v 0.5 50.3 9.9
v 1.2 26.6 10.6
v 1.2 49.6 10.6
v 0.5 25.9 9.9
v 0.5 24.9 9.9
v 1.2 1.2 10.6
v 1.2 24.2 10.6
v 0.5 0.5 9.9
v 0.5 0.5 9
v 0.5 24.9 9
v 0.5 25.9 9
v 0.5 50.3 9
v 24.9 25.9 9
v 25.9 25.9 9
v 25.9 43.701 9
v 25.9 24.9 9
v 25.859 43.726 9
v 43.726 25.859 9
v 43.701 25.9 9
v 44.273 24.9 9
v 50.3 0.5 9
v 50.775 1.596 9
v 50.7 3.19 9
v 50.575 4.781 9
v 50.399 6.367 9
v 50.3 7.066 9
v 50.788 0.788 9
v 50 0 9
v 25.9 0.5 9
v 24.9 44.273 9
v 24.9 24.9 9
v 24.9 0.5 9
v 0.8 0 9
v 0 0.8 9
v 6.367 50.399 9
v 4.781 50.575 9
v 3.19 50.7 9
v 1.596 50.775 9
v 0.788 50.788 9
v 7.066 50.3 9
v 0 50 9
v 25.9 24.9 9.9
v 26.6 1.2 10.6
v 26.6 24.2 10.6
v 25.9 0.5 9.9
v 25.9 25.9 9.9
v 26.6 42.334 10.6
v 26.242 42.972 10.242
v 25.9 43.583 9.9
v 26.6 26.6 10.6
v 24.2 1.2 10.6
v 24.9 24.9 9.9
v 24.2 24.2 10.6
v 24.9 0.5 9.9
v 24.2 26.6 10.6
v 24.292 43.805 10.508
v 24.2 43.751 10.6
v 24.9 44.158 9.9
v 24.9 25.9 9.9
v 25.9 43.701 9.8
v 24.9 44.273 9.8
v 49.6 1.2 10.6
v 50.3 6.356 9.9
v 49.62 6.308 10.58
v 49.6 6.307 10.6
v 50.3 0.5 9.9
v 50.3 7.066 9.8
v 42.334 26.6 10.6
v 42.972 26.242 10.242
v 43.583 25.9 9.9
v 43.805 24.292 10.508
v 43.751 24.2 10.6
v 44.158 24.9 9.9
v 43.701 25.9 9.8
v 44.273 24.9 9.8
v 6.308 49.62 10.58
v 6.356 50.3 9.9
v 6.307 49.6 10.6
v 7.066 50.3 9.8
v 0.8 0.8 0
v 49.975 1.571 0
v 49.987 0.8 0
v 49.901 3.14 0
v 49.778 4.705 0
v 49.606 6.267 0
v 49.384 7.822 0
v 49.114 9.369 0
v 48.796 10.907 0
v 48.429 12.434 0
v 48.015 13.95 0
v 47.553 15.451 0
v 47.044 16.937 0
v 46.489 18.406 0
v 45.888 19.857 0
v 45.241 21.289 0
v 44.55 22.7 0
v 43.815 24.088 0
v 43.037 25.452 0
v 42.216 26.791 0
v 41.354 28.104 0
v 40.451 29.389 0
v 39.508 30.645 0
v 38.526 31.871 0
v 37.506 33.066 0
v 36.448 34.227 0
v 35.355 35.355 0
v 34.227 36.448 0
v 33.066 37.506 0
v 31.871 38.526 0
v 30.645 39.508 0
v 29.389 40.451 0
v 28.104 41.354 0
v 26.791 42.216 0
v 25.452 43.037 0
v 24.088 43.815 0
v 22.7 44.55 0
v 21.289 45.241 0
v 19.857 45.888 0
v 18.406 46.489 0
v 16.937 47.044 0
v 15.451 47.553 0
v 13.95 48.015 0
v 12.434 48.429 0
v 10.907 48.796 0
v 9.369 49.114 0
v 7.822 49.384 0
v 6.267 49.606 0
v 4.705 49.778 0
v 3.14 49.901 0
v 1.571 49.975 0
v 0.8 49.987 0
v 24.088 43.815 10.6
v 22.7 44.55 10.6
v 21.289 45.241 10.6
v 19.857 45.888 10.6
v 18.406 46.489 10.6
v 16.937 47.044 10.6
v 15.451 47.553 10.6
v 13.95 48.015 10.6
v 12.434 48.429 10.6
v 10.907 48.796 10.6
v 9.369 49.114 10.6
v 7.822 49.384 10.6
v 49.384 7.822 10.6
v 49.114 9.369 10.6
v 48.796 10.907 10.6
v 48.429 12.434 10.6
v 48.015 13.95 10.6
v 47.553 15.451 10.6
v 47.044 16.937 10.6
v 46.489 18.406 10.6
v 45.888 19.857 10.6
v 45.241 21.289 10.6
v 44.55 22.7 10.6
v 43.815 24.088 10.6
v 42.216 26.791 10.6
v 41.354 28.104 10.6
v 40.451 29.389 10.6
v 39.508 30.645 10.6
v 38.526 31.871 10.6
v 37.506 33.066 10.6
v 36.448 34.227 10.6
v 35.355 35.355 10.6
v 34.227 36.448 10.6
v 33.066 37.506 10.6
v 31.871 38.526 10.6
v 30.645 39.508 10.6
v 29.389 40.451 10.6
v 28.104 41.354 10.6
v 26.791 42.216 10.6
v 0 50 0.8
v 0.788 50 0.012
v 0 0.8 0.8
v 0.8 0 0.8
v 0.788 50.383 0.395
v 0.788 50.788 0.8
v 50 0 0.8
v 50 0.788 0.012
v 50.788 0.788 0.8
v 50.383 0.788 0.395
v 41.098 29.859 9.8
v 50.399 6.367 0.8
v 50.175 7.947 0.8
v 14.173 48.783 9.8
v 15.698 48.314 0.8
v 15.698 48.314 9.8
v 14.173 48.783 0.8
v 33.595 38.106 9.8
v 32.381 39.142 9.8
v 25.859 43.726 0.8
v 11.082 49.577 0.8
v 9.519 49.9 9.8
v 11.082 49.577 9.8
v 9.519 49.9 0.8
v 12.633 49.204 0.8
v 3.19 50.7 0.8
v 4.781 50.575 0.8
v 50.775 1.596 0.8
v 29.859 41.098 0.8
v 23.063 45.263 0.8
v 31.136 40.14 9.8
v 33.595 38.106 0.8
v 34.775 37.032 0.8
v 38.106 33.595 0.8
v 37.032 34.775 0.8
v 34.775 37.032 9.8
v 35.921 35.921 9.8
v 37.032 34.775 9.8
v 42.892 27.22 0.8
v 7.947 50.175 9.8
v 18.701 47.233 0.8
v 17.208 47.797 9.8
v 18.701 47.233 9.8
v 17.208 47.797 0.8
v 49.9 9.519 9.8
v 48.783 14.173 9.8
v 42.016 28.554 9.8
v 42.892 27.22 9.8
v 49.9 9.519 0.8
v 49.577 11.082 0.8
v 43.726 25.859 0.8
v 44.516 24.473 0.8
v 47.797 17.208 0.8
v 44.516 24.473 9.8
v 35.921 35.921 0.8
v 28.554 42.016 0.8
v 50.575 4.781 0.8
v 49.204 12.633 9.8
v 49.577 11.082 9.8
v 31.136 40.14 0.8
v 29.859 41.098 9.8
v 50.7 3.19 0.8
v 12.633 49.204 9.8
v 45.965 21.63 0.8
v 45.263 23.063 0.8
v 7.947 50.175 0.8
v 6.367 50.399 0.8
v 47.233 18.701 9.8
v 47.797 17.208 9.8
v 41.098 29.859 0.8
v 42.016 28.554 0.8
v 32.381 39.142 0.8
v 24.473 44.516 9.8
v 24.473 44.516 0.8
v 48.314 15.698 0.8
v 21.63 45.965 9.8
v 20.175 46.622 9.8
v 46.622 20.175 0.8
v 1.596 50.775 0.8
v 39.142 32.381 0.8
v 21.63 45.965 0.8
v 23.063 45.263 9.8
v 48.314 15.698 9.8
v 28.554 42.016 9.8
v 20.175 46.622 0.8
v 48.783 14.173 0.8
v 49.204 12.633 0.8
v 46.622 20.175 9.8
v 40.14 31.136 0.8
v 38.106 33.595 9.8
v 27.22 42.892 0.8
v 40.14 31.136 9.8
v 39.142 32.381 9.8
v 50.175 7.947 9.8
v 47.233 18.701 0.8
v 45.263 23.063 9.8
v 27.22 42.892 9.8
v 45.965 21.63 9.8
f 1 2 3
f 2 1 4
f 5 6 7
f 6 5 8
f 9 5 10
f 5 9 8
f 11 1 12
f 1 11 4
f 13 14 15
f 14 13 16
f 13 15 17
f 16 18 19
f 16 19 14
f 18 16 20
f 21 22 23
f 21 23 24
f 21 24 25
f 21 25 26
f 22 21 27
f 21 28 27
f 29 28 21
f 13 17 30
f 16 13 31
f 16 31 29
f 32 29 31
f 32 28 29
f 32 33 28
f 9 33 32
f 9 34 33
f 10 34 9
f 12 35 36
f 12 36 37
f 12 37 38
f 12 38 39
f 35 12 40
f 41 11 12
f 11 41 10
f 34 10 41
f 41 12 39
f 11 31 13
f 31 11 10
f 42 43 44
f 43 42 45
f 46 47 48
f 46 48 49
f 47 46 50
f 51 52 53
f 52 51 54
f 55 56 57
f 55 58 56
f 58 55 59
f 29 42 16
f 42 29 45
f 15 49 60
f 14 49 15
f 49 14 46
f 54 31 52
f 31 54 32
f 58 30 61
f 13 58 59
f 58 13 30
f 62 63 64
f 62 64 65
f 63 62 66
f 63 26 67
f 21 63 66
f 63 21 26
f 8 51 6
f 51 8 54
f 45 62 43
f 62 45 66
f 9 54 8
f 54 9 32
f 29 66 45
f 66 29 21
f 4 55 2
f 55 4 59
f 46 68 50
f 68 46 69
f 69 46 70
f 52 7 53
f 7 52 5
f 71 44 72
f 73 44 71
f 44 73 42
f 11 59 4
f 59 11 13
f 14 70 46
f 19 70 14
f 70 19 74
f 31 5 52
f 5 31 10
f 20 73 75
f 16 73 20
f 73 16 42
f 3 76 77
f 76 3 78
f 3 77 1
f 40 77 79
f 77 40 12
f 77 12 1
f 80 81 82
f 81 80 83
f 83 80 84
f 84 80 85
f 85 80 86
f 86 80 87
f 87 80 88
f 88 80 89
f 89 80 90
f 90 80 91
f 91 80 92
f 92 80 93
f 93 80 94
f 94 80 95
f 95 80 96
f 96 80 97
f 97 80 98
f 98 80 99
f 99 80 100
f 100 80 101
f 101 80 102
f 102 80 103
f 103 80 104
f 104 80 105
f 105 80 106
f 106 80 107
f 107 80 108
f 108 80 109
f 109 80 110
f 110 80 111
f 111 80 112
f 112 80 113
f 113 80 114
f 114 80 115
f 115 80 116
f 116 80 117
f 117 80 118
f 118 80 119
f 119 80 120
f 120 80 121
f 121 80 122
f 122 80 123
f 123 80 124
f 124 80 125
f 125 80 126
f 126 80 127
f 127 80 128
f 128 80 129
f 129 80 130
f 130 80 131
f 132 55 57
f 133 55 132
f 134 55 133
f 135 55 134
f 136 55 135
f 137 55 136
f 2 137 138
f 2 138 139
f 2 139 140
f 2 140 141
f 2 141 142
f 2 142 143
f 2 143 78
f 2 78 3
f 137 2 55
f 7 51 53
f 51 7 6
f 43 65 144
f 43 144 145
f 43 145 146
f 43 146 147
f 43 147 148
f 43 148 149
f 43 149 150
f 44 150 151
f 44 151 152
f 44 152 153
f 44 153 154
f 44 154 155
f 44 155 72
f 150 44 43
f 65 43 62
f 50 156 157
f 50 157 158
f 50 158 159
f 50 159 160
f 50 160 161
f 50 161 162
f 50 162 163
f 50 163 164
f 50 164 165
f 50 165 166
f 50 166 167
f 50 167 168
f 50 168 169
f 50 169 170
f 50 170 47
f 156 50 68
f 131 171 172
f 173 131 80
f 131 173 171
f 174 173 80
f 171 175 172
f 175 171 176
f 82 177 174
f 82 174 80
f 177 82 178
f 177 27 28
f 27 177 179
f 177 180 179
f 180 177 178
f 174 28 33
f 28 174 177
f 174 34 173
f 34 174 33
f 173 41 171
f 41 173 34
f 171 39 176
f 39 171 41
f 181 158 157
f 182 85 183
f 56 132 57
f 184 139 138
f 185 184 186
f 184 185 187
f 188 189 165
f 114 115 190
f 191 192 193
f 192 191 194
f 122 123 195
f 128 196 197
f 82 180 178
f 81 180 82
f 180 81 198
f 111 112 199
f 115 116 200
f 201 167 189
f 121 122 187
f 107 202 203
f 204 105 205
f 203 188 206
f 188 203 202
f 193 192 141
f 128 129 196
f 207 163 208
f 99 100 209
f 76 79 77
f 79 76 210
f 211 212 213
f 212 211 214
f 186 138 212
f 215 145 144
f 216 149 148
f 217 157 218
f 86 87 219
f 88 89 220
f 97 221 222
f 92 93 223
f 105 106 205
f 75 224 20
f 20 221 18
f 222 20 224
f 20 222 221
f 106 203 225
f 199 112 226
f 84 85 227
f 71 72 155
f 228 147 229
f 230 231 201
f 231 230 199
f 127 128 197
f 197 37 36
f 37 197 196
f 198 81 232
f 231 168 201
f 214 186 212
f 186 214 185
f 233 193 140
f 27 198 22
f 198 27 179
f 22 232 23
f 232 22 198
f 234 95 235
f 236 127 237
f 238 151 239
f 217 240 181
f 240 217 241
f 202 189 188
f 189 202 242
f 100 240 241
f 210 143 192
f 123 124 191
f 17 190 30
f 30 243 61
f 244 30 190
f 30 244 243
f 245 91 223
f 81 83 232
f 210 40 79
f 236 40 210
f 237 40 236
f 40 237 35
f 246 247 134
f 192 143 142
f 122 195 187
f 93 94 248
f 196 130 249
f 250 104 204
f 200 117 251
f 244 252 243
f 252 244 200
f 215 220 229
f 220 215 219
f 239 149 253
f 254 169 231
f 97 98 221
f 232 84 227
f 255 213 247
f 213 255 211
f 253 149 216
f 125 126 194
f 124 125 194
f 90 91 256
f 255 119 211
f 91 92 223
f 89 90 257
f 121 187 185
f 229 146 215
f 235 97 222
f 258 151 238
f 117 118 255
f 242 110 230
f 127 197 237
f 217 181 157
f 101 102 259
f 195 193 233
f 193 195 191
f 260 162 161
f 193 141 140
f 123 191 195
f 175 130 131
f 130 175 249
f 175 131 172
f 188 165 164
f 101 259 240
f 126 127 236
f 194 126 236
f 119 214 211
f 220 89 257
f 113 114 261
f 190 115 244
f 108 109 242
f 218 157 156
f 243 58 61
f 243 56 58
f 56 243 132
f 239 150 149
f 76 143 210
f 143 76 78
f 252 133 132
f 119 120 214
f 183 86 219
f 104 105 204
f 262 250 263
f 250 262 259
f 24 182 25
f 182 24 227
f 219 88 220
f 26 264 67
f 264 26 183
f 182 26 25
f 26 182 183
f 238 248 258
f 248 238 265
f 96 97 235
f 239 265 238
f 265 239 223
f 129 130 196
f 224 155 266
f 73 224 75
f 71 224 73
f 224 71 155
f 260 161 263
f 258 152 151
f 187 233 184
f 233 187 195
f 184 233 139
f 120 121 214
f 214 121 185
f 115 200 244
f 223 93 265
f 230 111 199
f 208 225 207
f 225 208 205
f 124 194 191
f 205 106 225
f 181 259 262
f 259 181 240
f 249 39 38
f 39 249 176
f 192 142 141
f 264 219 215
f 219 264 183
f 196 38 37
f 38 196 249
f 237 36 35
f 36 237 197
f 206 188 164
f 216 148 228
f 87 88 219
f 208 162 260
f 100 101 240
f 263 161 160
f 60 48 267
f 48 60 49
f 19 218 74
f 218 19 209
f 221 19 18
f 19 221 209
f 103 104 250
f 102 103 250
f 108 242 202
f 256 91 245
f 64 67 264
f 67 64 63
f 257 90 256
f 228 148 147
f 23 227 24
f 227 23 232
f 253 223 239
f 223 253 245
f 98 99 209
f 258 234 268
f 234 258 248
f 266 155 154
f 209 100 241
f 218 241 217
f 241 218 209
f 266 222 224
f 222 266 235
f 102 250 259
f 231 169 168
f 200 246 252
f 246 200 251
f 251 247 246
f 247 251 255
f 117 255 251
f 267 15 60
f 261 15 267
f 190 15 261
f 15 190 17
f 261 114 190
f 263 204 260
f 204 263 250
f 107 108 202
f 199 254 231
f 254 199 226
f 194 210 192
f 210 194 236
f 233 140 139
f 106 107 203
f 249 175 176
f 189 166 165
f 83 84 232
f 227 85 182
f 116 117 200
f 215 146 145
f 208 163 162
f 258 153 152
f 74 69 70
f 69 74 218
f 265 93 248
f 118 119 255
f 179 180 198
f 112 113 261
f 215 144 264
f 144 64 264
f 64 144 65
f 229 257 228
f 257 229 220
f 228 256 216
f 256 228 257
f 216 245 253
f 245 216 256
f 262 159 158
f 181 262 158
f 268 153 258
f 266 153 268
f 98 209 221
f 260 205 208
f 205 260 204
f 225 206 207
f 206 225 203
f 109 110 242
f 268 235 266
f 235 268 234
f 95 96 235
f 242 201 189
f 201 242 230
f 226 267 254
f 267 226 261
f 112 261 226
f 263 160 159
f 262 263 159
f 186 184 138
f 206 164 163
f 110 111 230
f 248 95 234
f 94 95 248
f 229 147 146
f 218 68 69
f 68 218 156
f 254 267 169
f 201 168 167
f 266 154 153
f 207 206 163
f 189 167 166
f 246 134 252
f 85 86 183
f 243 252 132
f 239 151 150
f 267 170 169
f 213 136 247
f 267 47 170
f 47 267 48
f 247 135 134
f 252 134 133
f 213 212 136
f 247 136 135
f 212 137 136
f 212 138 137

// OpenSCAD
// file: libs.scad
/* set values */
//bottom thickness, total
floor_thick=10.6;
//line cuts, depth from top of bottom
floor_depth=1.6;
//square basis (inch)
basis=25.4;
//width scale for grid 45 degree edges
groove=1.2;
//width of the floor grid lines
floor_cut=1;
//bottom side bevel
bevel=.8;
//layer thickness
layer_t=.2;
//small value
ep=0.01;
//how much wall to put around the magnets
print_wall=.7;
//magnet
magnet_r=6/2;
//wall width
wall_width=.45;
//how many layers of bricks
wall_layers=3;
//height of wall, short
wall_height=1*basis;
//brick grooves in wall
wall_groove=.6;
$fs=1;
$fa=1;

module floor_plate(xsize,ysize)
{
    translate([xsize*basis/2,ysize*basis/2,floor_thick/2])hull()
    {
        cube([xsize*basis-bevel*2,ysize*basis-bevel*2,floor_thick],center=true);
        cube([xsize*basis-bevel*2,ysize*basis,floor_thick-bevel*2],center=true);
        cube([xsize*basis,ysize*basis-bevel*2,floor_thick-bevel*2],center=true);
    }
}

module grids(xsize,ysize)
{
    for (ii=[0:xsize])
    {
        translate([ii*basis,ysize*basis/2,floor_thick])rotate([0,45,0])cube([groove*sqrt(2),ysize*basis*2,groove*sqrt(2)],center=true);
        translate([ii*basis,ysize*basis/2,floor_thick-floor_depth/2])rotate([0,0,0])cube([floor_cut,ysize*basis*2,floor_depth],center=true);
    }
    for (ii=[0:ysize])
    {
        translate([xsize*basis/2,ii*basis,floor_thick])rotate([45,0,0])cube([xsize*basis*2,groove*sqrt(2),groove*sqrt(2)],center=true);
        translate([xsize*basis/2,ii*basis,floor_thick-floor_depth/2])rotate([0,0,0])cube([xsize*basis*2,floor_cut,floor_depth],center=true);
    }
}

/*
 * Openlock connection bay
 */
module openlock_chamber(buffer=0) {
    translate([-buffer,-7,1.4]) cube([2+buffer,7*2,4.4]);
    hull() {
        translate([0,-6,1.4]) cube([2,6*2,4.4]);
        translate([3+0.01,-5,1.4]) cube([2,5*2,4.4]);
    }
    translate([5,-5,1.4]) cube([8,5*2,4.4]);
    translate([7.55,-5.25,1.4]) cube([6,5.5*2,4.4]);
}
module square_openlocks(xsize,ysize)
{
    //left side
    if (ysize>1)
    {
        for(aa=[1:ysize-1])
        {
            translate([0,aa*basis,0])openlock_chamber(1);
        }
        //right side
        for(aa=[1:ysize-1])
        {
            translate([xsize*basis,aa*basis,0])rotate([0,0,180])openlock_chamber(1);
        }
    }
    if (xsize>1)
    {
        //front side
        for(aa=[1:xsize-1])
        {
            translate([aa*basis,0,0])rotate([0,0,90])openlock_chamber(1);
        }
        //back side
        for(aa=[1:xsize-1])
        {
            translate([aa*basis,ysize*basis,0])rotate([0,0,270])openlock_chamber(1);
        }
    }
}
module linear_openlocks(size)
{
    //left side
    if (size>1)
    {
        for(aa=[1:size-1])
        {
            translate([0,aa*basis,0])rotate([0,0,180])openlock_chamber(1);
        }
    }
}
module round_openlocks(size)
{
    if (size>1)
    {
        rotate([0,0,45])translate([size*basis,0,0])rotate([0,0,180])openlock_chamber(1);
    }
}
module round_wall_openlocks(size)
{
    if (size>1)
    {
        rotate([0,0,45])translate([size*basis,0,0])openlock_chamber(1);
    }
}
module square_mag_holes(xsize,ysize)
{
    for (ii=[0:xsize-1])
    {
        translate([ii*basis+basis*.5,magnet_r+print_wall,1])rotate([0,0,360/32])cylinder(r=magnet_r,h=magnet_r*2,$fn=16);
        translate([ii*basis+basis*.5,basis*ysize-(magnet_r+print_wall),1])rotate([0,0,360/32])cylinder(r=magnet_r,h=magnet_r*2,$fn=16);
        //witness holes
        translate([ii*basis+basis*.5,magnet_r+print_wall,1])rotate([0,0,360/32])cylinder(r=.9,h=floor_thick,center=true,$fn=16);
        translate([ii*basis+basis*.5,basis*ysize-(magnet_r+print_wall),1])rotate([0,0,360/32])cylinder(r=.9,h=floor_thick,center=true,$fn=16);
    }
    for (ii=[0:ysize-1])
    {
        translate([magnet_r+print_wall,ii*basis+basis*.5,1])rotate([0,0,360/32])cylinder(r=magnet_r,h=magnet_r*2,$fn=16);
        translate([basis*xsize-(magnet_r+print_wall),ii*basis+basis*.5,1])rotate([0,0,360/32])cylinder(r=magnet_r,h=magnet_r*2,$fn=16);
        //witness holes
        translate([magnet_r+print_wall,ii*basis+basis*.5,1])rotate([0,0,360/32])cylinder(r=.9,h=floor_thick,center=true,$fn=16);
        translate([basis*xsize-(magnet_r+print_wall),ii*basis+basis*.5,1])rotate([0,0,360/32])cylinder(r=.9,h=floor_thick,center=true,$fn=16);
    }
}
module linear_mag_holes(size)
{
    for (ii=[0:size-1])
    {
        translate([-magnet_r-print_wall,ii*basis+basis*.5,1])rotate([0,0,360/32])cylinder(r=magnet_r,h=magnet_r*2,$fn=16);
        
        //witness holes
        translate([-magnet_r-print_wall,ii*basis+basis*.5,1])rotate([0,0,360/32])cylinder(r=.9,h=floor_thick,center=true,$fn=16);
        
    }
}
module round_wall_holes(radius)
{
    //round edges
    
    offset=sqrt((basis*radius*basis*radius)-(basis*basis/4))+magnet_r+print_wall;
    //near y axis
    translate([basis/2,offset,1])cylinder(r=magnet_r,h=magnet_r*2,$fn=16);
    //witness holes
    translate([basis/2,offset,1])cylinder(r=.9,h=floor_thick,center=true,$fn=16);
    //near x axis
    translate([offset,basis/2,1])rotate([0,0,360/32])cylinder(r=magnet_r,h=magnet_r*2,$fn=16);
    //witness holes
    translate([offset,basis/2,1])rotate([0,0,360/32])cylinder(r=.9,h=floor_thick,center=true,$fn=16);
}
module round_mag_holes(radius)
{
    //flat sides
    for (ii=[0:radius-1])
    {
        translate([ii*basis+basis*.5,magnet_r+print_wall,1])rotate([0,0,360/32])cylinder(r=magnet_r,h=magnet_r*2,$fn=16);

        //witness holes
        translate([ii*basis+basis*.5,magnet_r+print_wall,1])rotate([0,0,360/32])cylinder(r=.9,h=floor_thick,center=true,$fn=16);

    }
    for (ii=[0:radius-1])
    {
        translate([magnet_r+print_wall,ii*basis+basis*.5,1])rotate([0,0,360/32])cylinder(r=magnet_r,h=magnet_r*2,$fn=16);

        //witness holes
        translate([magnet_r+print_wall,ii*basis+basis*.5,1])rotate([0,0,360/32])cylinder(r=.9,h=floor_thick,center=true,$fn=16);

    }
    //round edges
    
    offset=sqrt((basis*radius*basis*radius)-(basis*basis/4))-magnet_r-print_wall;
    //near y axis
    translate([basis/2,offset,1])rotate([0,0,360/32])cylinder(r=magnet_r,h=magnet_r*2,$fn=16);
    //witness holes
    translate([basis/2,offset,1])rotate([0,0,360/32])cylinder(r=.9,h=floor_thick,center=true,$fn=16);
    //near x axis
    translate([offset,basis/2,1])rotate([0,0,360/32])cylinder(r=magnet_r,h=magnet_r*2,$fn=16);
    //witness holes
    translate([offset,basis/2,1])rotate([0,0,360/32])cylinder(r=.9,h=floor_thick,center=true,$fn=16);
}
// main file
include <libs.scad>;

//floor
round(2);

*square(4,4);

//import("AS_full.stl");


module square(xsize,ysize)
{
    difference()
    {
        floor_plate(xsize,ysize);
        
        grids(xsize,ysize);
    }
}

module round(radius)
{
    intersection()
    {
        difference()
        {
            floor_plate(radius,radius);
            grids(radius,radius);
        }
        hull()
        {
            translate([0,0,bevel])cylinder(r=radius*basis,h=floor_thick-bevel*2,$fn=200);
            cylinder(r=radius*basis-bevel,h=floor_thick,$fn=200);
        }
    }
}
